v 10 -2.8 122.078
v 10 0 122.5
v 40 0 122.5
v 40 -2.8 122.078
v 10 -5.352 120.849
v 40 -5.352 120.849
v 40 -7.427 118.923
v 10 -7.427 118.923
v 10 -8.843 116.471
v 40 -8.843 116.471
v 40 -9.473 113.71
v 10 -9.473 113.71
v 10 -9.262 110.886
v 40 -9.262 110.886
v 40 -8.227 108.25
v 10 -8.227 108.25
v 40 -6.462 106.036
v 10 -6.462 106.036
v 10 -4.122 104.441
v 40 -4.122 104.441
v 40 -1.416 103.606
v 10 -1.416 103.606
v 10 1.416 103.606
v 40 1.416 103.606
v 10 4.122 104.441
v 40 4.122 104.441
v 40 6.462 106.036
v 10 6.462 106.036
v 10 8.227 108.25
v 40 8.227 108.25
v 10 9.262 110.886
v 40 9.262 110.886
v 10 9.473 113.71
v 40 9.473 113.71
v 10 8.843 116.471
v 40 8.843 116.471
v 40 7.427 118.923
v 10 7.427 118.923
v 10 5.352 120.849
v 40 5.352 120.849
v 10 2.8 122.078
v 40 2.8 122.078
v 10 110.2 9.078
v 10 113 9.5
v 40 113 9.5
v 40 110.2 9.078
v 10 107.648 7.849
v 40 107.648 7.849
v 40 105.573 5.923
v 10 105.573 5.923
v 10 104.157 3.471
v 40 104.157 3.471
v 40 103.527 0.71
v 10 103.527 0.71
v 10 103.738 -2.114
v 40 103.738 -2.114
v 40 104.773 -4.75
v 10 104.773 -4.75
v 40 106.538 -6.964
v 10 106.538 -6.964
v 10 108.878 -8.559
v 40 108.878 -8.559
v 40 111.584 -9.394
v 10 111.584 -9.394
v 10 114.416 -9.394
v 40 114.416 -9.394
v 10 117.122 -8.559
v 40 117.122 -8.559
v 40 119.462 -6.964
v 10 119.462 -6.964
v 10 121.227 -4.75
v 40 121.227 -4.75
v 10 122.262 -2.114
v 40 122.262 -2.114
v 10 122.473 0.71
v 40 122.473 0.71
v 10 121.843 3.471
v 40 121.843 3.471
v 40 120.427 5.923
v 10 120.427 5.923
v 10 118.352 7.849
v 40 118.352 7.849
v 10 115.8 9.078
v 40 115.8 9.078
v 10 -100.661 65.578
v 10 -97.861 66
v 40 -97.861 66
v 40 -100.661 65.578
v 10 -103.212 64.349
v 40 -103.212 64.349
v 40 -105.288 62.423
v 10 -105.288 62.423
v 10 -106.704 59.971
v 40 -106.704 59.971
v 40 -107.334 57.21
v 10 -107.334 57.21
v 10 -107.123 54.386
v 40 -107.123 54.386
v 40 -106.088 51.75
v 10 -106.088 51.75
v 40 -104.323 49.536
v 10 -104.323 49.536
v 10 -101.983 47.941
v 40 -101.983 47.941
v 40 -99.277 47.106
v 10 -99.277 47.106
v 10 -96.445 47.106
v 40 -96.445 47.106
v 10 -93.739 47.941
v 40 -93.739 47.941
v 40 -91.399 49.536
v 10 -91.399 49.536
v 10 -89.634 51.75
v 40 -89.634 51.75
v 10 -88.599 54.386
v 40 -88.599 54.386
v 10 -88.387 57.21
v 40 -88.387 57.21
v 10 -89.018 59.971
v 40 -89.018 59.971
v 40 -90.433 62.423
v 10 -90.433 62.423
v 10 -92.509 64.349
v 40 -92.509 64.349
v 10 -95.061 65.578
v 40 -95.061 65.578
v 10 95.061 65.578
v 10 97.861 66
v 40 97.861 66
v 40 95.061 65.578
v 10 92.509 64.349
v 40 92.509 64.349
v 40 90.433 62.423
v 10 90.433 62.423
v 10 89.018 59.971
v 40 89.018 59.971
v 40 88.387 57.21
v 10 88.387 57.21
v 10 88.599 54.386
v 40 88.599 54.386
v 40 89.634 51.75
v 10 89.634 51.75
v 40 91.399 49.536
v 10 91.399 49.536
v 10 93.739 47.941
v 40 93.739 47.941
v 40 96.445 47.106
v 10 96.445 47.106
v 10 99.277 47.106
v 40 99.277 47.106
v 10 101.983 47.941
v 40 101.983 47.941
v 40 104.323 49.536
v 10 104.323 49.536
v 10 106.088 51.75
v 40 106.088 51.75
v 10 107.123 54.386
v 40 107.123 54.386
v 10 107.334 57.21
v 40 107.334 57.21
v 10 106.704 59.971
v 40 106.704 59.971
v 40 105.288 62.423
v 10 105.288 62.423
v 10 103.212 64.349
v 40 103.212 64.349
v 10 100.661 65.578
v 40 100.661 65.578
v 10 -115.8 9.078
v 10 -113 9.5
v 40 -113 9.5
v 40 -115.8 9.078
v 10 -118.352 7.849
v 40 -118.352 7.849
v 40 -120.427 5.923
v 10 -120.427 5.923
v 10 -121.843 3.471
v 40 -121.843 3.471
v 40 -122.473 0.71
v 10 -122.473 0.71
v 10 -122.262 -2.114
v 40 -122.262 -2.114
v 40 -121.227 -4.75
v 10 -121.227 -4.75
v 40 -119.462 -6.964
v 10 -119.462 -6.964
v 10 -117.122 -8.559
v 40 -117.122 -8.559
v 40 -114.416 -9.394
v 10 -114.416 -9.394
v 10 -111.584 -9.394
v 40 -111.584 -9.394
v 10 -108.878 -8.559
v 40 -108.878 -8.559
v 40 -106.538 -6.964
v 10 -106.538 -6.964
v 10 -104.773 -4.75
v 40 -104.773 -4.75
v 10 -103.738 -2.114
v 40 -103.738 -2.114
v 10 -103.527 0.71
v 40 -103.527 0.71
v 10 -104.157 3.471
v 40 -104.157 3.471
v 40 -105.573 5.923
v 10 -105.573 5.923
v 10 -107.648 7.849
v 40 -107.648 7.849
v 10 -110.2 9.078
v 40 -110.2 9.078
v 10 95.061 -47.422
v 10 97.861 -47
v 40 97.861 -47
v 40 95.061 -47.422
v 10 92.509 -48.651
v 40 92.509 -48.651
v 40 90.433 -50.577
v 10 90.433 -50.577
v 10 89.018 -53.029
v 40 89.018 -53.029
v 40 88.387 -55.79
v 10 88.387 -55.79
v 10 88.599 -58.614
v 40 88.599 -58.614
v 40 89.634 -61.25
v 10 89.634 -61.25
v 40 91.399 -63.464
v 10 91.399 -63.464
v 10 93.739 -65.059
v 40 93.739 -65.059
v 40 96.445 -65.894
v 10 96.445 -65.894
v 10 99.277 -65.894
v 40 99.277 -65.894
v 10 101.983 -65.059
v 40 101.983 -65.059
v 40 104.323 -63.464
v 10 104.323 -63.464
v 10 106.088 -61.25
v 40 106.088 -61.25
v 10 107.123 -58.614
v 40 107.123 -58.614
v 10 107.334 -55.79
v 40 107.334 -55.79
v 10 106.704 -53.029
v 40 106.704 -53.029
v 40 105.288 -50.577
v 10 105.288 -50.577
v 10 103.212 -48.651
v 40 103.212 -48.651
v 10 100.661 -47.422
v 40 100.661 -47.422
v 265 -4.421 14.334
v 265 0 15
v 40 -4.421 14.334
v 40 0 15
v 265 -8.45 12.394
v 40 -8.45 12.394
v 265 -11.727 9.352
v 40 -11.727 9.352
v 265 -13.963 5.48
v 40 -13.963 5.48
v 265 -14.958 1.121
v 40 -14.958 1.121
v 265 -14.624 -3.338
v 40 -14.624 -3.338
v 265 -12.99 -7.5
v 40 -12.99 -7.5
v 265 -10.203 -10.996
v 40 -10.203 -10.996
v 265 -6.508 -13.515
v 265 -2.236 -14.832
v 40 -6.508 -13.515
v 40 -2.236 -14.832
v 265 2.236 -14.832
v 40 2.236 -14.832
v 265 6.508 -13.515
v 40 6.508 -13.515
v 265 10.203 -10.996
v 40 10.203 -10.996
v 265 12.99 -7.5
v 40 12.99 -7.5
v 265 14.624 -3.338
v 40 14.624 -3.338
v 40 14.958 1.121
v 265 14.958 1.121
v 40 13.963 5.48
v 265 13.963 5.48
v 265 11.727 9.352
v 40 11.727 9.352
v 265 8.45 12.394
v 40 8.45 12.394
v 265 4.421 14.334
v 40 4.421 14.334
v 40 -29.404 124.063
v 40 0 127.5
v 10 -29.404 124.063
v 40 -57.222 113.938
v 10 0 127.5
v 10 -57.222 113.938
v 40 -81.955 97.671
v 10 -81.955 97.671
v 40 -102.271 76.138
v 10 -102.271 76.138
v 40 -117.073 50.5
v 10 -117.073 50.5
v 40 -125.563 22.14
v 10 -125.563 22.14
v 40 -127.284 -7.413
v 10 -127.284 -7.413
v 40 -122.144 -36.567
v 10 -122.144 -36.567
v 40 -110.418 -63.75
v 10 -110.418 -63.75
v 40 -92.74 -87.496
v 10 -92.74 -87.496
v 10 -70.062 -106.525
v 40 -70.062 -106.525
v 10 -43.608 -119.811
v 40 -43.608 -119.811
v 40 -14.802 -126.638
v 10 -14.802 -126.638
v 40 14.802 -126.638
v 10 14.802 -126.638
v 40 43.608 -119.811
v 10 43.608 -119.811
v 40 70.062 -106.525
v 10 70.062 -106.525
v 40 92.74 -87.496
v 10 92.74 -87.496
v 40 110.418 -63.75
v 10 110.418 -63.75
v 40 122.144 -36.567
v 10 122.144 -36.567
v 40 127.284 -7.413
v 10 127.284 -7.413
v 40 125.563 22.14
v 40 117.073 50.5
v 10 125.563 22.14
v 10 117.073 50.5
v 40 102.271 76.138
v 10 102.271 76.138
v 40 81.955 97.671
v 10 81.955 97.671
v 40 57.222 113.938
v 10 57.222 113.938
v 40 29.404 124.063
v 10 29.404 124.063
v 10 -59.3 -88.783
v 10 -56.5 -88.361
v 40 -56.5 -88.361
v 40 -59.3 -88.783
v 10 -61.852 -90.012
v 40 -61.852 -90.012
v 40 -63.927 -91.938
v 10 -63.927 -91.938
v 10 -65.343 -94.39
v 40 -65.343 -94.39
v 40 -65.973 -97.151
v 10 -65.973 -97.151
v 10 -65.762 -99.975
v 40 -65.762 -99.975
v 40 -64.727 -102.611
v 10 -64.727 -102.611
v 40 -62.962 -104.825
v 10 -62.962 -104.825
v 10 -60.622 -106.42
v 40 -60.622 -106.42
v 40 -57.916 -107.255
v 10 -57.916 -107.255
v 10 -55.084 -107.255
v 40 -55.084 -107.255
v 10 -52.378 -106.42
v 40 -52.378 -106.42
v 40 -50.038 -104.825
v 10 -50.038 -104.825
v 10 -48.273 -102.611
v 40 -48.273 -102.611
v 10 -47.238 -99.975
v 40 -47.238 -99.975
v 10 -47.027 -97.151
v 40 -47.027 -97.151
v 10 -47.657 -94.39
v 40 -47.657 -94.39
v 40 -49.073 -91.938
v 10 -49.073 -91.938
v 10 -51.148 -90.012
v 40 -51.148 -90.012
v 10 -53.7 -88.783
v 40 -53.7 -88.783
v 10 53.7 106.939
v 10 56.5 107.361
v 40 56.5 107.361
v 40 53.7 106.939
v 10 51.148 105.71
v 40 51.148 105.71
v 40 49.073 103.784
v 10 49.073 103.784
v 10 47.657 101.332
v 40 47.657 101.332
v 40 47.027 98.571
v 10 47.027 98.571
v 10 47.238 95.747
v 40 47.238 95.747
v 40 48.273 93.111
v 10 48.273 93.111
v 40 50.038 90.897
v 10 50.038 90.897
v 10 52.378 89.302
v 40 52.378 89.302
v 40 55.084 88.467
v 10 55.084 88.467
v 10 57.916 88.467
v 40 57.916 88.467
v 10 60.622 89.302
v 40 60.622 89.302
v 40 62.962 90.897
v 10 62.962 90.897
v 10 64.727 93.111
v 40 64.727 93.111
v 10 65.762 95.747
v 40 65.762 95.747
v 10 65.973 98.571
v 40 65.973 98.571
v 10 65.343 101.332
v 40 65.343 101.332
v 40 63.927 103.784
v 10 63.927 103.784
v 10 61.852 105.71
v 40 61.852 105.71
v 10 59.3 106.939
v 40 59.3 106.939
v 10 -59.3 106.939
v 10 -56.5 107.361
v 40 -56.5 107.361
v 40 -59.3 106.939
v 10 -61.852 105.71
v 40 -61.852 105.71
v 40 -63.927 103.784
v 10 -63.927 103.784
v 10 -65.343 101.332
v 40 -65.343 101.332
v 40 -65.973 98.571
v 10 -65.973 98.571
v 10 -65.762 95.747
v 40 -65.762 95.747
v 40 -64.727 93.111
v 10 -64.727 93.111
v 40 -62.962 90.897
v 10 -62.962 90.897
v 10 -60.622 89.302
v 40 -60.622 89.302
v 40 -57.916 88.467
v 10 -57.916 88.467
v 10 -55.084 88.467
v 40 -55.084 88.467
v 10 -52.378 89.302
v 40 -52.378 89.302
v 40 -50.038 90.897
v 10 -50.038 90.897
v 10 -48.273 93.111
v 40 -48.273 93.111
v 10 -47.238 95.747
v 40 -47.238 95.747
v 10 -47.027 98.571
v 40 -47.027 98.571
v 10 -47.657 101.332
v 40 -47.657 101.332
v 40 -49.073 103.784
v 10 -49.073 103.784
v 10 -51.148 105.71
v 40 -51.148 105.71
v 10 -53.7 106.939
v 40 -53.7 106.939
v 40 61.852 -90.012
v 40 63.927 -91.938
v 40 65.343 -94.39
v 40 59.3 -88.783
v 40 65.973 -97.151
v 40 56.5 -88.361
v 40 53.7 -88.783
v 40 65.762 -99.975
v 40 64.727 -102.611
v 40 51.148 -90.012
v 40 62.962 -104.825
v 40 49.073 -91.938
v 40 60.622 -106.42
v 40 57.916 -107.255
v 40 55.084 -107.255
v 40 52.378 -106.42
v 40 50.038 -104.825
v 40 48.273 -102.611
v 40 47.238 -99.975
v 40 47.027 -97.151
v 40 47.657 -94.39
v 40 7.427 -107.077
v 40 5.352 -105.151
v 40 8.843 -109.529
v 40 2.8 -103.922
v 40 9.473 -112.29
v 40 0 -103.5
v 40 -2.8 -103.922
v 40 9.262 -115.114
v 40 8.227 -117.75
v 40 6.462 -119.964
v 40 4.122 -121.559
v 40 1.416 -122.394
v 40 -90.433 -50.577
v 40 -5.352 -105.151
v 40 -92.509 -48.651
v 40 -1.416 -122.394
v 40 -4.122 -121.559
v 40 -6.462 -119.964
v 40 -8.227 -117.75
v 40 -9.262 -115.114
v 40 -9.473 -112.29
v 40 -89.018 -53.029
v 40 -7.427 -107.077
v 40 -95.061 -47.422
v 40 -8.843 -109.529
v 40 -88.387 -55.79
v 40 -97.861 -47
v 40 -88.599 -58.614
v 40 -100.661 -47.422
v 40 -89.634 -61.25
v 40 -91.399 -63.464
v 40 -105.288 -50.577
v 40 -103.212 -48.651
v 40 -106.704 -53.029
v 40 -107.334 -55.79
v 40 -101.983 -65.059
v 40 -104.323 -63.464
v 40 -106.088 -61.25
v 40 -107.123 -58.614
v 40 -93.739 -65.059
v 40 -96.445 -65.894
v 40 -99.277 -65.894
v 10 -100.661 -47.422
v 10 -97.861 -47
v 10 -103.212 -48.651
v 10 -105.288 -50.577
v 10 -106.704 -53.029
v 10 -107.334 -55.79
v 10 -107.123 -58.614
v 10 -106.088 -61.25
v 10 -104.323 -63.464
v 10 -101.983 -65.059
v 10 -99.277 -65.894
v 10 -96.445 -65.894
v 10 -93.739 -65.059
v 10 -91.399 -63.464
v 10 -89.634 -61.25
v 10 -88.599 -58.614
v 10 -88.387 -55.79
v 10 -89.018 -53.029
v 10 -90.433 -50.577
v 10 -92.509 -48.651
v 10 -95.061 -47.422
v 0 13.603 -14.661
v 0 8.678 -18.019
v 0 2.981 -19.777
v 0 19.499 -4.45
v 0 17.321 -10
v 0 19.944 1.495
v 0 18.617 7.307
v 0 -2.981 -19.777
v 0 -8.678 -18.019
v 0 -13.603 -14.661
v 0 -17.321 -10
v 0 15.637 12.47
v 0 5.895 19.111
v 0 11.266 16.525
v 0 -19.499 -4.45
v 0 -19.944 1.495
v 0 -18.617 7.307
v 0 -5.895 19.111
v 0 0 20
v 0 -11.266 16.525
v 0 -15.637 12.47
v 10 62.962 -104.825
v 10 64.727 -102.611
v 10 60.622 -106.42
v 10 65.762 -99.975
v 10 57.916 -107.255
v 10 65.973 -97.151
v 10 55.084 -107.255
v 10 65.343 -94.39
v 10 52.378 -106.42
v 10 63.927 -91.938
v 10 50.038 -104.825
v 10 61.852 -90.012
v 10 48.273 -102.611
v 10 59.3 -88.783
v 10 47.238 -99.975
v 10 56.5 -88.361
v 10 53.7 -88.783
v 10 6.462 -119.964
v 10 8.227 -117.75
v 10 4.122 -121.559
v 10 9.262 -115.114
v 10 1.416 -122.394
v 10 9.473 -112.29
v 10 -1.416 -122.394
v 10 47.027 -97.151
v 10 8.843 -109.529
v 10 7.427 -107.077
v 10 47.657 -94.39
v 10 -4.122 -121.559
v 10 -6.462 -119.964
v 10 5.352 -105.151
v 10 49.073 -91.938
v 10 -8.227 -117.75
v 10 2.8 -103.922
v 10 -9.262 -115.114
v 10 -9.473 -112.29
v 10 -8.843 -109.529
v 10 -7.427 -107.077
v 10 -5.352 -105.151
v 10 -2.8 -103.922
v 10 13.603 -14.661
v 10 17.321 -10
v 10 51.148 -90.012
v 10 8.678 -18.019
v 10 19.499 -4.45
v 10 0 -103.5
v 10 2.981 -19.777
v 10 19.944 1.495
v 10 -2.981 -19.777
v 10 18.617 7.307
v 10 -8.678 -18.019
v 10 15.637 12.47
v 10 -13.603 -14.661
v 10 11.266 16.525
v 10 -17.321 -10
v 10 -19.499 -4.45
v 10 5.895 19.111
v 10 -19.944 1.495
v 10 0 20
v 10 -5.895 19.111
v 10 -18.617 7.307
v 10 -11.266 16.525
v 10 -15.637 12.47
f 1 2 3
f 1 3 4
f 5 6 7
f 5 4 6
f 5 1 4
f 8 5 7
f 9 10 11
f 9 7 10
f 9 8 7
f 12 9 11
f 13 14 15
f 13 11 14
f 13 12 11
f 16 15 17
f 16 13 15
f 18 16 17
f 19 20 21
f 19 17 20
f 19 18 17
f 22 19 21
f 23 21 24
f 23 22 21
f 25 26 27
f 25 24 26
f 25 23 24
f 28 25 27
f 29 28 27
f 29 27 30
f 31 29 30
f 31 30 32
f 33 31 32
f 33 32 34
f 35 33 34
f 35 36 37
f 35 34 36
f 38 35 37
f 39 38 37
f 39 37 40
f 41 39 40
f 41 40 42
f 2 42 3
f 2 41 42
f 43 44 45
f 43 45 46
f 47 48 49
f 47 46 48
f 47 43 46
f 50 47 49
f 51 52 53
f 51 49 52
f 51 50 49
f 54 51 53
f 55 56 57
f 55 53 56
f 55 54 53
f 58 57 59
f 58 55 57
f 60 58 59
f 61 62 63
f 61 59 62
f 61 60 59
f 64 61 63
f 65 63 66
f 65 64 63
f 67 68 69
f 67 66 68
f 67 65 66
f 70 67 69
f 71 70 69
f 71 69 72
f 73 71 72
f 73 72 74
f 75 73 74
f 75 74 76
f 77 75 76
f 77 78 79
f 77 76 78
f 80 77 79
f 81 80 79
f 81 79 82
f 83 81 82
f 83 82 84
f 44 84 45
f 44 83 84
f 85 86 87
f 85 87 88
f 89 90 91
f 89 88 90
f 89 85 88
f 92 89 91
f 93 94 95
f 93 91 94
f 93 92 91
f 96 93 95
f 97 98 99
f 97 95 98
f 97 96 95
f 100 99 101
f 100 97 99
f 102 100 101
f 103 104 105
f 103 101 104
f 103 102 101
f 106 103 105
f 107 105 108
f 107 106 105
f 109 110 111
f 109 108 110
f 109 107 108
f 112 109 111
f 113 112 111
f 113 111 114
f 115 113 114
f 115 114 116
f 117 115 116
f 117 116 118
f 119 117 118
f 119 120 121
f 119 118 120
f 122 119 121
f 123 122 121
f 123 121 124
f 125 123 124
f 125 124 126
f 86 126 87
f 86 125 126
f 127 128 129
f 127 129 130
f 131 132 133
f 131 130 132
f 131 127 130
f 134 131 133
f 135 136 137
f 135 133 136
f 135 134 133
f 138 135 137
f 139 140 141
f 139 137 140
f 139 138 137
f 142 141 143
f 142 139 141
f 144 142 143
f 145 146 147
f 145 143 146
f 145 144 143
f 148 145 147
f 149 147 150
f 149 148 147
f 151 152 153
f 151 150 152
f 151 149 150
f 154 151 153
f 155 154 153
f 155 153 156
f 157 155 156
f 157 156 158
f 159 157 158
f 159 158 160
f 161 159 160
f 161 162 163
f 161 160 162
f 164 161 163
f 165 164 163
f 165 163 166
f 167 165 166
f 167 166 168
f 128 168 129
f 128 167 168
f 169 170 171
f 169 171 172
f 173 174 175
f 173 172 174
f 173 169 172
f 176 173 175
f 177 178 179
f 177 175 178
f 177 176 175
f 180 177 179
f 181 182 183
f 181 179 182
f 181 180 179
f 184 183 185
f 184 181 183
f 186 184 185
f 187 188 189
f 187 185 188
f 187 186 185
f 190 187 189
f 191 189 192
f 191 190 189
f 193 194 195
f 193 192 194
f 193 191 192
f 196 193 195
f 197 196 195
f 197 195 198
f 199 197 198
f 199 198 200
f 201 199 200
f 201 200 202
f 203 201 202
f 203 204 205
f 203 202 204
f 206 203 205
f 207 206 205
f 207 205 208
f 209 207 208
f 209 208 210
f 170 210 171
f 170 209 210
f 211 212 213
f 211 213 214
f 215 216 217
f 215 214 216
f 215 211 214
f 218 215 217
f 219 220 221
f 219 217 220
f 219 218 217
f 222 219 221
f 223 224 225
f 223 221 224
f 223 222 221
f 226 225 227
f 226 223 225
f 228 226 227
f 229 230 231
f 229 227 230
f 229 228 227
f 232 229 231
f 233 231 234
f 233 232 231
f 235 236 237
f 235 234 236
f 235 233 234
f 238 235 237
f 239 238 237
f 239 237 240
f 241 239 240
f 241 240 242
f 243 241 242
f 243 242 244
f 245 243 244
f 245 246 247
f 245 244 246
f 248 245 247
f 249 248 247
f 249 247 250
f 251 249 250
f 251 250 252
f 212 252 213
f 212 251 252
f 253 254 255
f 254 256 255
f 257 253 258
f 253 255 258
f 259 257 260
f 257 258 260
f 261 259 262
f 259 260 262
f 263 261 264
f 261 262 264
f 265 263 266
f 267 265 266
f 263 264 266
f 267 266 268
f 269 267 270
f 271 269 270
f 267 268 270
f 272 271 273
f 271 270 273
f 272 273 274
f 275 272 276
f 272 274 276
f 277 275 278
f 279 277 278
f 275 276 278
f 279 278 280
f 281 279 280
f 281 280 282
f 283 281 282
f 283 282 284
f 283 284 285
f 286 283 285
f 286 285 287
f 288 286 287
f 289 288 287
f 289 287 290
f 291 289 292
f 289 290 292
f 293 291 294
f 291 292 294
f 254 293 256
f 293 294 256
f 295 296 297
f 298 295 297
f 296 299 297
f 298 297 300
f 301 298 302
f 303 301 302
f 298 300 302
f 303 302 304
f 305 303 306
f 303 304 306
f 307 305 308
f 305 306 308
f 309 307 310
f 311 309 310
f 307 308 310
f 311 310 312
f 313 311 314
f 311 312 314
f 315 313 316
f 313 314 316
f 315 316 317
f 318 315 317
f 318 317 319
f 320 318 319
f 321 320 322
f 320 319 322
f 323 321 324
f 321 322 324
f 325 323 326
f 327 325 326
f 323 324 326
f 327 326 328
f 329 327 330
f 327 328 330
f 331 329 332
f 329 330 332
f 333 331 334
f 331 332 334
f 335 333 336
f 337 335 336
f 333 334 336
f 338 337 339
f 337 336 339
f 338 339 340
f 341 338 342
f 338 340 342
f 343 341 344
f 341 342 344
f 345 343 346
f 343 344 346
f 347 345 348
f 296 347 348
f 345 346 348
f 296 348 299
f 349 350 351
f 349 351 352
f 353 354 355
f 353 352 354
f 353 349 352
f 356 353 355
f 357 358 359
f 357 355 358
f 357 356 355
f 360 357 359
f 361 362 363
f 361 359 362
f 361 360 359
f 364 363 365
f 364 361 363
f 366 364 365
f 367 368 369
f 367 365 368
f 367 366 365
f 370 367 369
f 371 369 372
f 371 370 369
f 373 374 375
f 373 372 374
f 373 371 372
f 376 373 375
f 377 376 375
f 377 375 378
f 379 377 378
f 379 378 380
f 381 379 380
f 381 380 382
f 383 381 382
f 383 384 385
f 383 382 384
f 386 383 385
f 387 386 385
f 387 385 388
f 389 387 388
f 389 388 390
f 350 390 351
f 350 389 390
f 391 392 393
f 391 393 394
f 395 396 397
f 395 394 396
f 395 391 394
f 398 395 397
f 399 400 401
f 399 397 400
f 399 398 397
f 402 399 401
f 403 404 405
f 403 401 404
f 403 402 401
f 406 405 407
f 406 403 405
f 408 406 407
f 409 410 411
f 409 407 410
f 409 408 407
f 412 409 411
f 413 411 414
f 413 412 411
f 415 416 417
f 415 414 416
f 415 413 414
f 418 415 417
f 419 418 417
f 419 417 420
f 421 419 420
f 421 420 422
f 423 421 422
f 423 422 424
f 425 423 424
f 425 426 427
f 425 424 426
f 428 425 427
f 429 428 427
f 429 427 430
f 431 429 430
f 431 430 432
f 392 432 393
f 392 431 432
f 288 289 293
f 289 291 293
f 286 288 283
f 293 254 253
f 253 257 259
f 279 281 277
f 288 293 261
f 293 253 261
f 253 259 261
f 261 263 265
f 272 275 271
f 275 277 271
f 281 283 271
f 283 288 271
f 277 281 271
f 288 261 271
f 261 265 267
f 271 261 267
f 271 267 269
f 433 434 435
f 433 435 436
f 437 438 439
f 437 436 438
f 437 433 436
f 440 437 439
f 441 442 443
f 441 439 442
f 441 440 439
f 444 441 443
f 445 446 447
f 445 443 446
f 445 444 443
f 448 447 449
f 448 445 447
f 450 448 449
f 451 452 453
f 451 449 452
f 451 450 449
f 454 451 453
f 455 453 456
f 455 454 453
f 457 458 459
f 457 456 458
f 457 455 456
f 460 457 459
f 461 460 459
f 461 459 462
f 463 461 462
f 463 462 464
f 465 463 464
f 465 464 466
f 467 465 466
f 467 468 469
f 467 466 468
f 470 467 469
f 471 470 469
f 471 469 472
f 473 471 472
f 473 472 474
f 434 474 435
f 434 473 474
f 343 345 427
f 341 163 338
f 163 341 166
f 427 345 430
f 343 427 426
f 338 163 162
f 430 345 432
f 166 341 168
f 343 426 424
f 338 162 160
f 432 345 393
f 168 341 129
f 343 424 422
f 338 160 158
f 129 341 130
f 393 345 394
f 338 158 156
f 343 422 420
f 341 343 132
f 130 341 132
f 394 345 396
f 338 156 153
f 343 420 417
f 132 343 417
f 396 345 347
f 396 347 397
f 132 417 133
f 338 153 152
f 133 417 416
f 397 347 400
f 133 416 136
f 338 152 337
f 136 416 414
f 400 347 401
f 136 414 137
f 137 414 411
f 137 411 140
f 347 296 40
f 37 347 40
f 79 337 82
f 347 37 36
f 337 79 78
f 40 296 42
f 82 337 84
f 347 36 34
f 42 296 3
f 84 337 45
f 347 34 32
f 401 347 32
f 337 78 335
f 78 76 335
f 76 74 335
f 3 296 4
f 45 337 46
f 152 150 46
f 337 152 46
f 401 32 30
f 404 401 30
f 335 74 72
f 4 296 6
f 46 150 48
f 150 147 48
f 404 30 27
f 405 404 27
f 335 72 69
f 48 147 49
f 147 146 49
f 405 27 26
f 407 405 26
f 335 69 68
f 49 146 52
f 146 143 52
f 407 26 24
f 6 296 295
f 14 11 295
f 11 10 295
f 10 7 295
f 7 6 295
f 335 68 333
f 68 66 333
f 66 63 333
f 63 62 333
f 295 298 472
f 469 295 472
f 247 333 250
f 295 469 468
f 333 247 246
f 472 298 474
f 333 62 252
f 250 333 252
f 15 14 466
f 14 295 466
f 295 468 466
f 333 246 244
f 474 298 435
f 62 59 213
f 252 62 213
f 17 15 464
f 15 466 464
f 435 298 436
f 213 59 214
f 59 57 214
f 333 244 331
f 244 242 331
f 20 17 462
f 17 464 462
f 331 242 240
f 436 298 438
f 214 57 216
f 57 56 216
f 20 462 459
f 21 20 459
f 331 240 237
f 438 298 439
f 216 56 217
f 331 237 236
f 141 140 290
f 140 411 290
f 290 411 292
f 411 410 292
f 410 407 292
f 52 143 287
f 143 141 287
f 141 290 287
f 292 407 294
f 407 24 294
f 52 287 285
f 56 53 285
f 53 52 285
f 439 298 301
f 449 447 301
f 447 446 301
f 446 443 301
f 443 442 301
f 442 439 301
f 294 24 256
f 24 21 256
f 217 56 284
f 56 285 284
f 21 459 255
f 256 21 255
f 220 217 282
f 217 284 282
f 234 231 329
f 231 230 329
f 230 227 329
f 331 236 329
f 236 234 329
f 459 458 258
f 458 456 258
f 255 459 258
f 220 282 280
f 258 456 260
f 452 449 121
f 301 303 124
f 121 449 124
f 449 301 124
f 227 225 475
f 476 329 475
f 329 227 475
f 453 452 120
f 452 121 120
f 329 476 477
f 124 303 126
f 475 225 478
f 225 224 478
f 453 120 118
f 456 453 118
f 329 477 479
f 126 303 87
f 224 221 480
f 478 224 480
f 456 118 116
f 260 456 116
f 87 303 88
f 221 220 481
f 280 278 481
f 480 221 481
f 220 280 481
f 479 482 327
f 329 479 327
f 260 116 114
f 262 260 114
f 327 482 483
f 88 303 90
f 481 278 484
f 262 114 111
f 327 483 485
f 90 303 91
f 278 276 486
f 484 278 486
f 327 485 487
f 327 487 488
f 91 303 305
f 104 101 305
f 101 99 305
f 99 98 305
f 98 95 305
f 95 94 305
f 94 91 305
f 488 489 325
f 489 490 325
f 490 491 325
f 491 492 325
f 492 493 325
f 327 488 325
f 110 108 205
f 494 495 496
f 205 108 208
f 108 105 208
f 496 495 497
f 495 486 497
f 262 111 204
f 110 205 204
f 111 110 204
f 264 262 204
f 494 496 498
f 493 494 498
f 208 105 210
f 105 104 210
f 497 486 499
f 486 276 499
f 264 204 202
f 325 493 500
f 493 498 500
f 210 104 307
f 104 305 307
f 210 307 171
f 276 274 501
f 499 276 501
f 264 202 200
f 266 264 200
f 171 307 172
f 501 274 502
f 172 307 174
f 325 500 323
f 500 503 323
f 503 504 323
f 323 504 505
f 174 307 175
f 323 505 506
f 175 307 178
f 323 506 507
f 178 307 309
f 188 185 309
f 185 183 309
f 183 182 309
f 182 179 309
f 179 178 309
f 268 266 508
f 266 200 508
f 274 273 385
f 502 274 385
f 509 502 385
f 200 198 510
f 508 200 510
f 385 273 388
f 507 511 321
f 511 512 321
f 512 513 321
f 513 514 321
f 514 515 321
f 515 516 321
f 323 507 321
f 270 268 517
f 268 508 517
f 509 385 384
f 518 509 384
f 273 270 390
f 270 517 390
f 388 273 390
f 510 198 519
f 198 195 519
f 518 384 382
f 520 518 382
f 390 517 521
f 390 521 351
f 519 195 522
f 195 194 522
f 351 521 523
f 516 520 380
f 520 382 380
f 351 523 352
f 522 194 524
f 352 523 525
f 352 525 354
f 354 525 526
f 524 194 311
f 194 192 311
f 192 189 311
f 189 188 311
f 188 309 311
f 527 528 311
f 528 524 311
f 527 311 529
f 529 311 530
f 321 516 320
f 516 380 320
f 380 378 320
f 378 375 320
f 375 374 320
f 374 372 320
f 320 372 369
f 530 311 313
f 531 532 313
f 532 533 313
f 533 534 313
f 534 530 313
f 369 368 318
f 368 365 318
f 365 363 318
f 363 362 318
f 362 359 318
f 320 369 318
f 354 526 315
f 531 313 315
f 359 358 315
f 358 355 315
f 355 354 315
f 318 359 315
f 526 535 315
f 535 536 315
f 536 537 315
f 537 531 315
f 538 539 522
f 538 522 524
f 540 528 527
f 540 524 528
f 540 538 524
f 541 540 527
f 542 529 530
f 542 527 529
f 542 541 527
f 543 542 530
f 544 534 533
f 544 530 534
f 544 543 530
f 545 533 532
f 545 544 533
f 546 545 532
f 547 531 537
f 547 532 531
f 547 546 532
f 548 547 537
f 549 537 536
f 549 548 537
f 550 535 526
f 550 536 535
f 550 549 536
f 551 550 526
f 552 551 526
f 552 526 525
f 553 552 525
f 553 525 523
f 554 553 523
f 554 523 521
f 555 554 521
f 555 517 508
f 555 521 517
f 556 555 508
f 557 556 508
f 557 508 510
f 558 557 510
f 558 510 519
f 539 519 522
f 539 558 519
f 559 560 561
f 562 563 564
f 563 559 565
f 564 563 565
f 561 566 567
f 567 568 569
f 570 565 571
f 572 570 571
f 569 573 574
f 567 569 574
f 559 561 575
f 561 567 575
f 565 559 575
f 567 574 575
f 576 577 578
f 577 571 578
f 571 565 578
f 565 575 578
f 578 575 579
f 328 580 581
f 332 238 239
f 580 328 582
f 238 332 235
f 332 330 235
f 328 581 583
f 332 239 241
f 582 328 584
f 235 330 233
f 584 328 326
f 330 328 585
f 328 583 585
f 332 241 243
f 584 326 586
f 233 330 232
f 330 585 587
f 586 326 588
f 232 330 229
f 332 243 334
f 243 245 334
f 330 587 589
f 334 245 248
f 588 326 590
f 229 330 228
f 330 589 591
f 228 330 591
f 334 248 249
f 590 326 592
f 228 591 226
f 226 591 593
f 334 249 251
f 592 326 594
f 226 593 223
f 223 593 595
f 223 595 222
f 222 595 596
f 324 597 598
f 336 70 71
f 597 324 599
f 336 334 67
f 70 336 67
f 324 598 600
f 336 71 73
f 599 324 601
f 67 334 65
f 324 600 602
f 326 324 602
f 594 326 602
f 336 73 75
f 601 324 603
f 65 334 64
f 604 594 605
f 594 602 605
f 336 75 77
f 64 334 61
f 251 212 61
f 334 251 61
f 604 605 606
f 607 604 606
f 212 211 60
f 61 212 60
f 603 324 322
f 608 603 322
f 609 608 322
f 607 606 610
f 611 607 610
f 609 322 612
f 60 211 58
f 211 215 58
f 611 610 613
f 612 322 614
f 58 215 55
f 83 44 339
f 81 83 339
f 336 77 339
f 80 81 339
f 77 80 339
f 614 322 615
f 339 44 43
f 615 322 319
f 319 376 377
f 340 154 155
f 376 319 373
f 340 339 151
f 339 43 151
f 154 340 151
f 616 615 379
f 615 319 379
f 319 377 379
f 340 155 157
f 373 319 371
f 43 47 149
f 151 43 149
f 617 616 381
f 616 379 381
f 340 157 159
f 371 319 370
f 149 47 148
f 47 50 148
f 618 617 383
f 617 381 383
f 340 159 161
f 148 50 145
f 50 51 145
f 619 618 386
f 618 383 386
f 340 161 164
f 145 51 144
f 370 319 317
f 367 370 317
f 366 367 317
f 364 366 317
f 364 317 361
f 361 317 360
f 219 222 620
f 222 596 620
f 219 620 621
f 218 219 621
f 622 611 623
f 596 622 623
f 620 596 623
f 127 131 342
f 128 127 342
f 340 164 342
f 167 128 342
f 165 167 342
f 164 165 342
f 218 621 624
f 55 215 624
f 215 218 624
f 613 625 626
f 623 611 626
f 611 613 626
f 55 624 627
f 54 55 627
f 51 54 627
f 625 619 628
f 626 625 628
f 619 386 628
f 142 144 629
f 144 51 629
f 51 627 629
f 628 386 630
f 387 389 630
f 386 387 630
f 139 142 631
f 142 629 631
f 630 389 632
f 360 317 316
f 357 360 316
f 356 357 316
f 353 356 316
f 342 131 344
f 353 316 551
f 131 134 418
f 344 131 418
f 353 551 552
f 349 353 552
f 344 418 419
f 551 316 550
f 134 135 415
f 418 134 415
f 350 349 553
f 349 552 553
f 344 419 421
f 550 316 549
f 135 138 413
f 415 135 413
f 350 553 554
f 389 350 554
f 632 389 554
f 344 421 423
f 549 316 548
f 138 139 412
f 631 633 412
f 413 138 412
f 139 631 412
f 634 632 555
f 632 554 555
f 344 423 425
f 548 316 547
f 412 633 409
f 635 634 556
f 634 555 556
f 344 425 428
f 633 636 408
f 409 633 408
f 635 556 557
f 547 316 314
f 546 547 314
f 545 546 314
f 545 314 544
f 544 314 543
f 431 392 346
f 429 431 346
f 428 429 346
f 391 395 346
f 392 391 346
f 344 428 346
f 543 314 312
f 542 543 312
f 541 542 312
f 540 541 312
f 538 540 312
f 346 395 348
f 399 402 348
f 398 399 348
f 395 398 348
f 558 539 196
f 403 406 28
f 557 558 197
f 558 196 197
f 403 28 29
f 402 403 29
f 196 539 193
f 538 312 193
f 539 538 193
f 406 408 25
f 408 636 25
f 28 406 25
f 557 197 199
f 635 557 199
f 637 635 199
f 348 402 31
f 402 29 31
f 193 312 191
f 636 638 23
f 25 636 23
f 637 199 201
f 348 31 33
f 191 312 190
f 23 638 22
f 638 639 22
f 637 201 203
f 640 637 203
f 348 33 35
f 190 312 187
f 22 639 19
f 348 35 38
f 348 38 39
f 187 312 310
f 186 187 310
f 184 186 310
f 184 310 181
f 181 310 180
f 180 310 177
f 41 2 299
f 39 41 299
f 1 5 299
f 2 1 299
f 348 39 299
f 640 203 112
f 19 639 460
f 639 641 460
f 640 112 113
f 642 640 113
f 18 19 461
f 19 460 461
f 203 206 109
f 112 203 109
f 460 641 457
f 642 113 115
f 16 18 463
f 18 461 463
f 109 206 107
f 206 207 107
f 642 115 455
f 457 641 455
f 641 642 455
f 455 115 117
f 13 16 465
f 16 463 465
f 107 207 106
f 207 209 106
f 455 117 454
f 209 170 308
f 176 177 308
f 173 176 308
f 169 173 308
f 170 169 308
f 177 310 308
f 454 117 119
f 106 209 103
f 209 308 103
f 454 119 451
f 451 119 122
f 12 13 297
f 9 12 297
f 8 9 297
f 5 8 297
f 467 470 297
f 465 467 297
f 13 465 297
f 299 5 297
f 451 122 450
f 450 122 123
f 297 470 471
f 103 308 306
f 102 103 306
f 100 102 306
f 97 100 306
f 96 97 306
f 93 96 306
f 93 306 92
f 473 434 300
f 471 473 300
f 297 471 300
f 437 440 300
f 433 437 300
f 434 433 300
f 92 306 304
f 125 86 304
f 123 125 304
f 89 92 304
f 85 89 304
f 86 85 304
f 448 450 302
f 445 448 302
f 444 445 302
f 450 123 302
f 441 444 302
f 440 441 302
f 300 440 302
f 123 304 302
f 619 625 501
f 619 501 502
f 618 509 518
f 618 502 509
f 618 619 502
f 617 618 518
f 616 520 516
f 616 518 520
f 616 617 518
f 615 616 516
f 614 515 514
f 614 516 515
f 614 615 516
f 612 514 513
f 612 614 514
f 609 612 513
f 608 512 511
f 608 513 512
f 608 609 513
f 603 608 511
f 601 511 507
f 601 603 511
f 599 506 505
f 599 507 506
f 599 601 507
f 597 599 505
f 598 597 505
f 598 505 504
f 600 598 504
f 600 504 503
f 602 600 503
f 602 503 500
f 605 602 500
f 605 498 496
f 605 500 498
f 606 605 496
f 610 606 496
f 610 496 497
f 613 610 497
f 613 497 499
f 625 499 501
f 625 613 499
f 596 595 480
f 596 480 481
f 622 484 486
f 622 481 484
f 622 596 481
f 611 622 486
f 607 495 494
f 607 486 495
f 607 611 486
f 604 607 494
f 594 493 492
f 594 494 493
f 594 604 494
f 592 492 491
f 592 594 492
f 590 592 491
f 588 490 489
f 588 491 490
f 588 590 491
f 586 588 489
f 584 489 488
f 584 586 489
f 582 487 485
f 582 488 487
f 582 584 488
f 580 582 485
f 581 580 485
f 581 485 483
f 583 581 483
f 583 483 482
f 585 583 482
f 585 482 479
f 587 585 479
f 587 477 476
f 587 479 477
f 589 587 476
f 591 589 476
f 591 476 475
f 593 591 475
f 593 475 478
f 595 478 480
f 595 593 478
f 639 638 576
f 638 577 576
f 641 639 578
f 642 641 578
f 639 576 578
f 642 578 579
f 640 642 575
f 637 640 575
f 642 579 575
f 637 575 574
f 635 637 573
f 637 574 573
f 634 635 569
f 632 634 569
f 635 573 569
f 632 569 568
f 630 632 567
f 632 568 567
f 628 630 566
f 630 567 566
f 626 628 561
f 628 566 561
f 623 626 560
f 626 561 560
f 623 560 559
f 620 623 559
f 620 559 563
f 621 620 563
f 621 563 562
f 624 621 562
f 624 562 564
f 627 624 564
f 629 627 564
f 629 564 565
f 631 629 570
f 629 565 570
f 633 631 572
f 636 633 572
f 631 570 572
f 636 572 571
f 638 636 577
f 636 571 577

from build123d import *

# Parameters (mm, degrees)
SKETCH_2_R           = 9.5
CUT_EXTRUDE_1_DEPTH  = 321.526909947
SKETCH_3_R           = 9.5
CUT_EXTRUDE_2_DEPTH  = 321.526909947
SKETCH_4_R           = 9.5
CUT_EXTRUDE_3_DEPTH  = 321.526909947
SKETCH_5_R           = 9.5
CUT_EXTRUDE_4_DEPTH  = 321.526909947
SKETCH_6_R           = 9.5
CUT_EXTRUDE_5_DEPTH  = 321.526909947
SKETCH_7_R           = 9.5
CUT_EXTRUDE_6_DEPTH  = 321.526909947
SKETCH_8_R           = 9.5
CUT_EXTRUDE_7_DEPTH  = 321.526909947
SKETCH_9_R           = 9.5
CUT_EXTRUDE_8_DEPTH  = 321.526909947
SKETCH_10_R          = 9.5
CUT_EXTRUDE_9_DEPTH  = 321.526909947
SKETCH_11_R          = 9.5
CUT_EXTRUDE_10_DEPTH = 321.526909947
SKETCH_12_R          = 9.5
CUT_EXTRUDE_11_DEPTH = 321.526909947
SKETCH_13_R          = 9.5
CUT_EXTRUDE_12_DEPTH = 321.526909947


with BuildPart() as part:
    # Эскиз1 → Повернуть1 (revolve)
    with BuildSketch(Plane.XY, mode=Mode.PRIVATE) as revolve_1_sk:
        Polygon((0, 0), (265, 0), (265, 15), (40, 15), (40, 127.5), (10, 127.5), (10, 20), (0, 20), align=None)
    revolve(revolve_1_sk.sketch.rotate(Axis((0, 0, 0), (1, 0, 0)), 90), axis=Axis((0, 0, 0), (1, 0, 0)))

    # Эскиз2 → Вырез-Вытянуть1 (cut, through all)
    with BuildSketch(Plane(origin=(0, 0, 0), x_dir=(0, 0, -1), z_dir=(1, 0, 0))):
        with Locations(Location((0, 113, 0), (0, 0, 180))):
            Circle(SKETCH_2_R)
    extrude(amount=CUT_EXTRUDE_1_DEPTH, mode=Mode.SUBTRACT)

    # Эскиз3 → Вырез-Вытянуть2 (cut, through all)
    with BuildSketch(Plane(origin=(0, 0, 0), x_dir=(0, 0, -1), z_dir=(1, 0, 0))):
        with Locations(Location((-56.5, 97.860870628, 0), (0, 0, 180))):
            Circle(SKETCH_3_R)
    extrude(amount=CUT_EXTRUDE_2_DEPTH, mode=Mode.SUBTRACT)

    # Эскиз4 → Вырез-Вытянуть3 (cut, through all)
    with BuildSketch(Plane(origin=(0, 0, 0), x_dir=(0, 0, -1), z_dir=(1, 0, 0))):
        with Locations(Location((-97.860870628, 56.5, 0), (0, 0, 180))):
            Circle(SKETCH_4_R)
    extrude(amount=CUT_EXTRUDE_3_DEPTH, mode=Mode.SUBTRACT)

    # Эскиз5 → Вырез-Вытянуть4 (cut, through all)
    with BuildSketch(Plane(origin=(0, 0, 0), x_dir=(0, 0, -1), z_dir=(1, 0, 0))):
        with Locations(Location((-113, 0, 0), (0, 0, 180))):
            Circle(SKETCH_5_R)
    extrude(amount=CUT_EXTRUDE_4_DEPTH, mode=Mode.SUBTRACT)

    # Эскиз6 → Вырез-Вытянуть5 (cut, through all)
    with BuildSketch(Plane(origin=(0, 0, 0), x_dir=(0, 0, -1), z_dir=(1, 0, 0))):
        with Locations(Location((-97.860870628, -56.5, 0), (0, 0, 180))):
            Circle(SKETCH_6_R)
    extrude(amount=CUT_EXTRUDE_5_DEPTH, mode=Mode.SUBTRACT)

    # Эскиз7 → Вырез-Вытянуть6 (cut, through all)
    with BuildSketch(Plane(origin=(0, 0, 0), x_dir=(0, 0, -1), z_dir=(1, 0, 0))):
        with Locations(Location((-56.5, -97.860870628, 0), (0, 0, 180))):
            Circle(SKETCH_7_R)
    extrude(amount=CUT_EXTRUDE_6_DEPTH, mode=Mode.SUBTRACT)

    # Эскиз8 → Вырез-Вытянуть7 (cut, through all)
    with BuildSketch(Plane(origin=(0, 0, 0), x_dir=(0, 0, -1), z_dir=(1, 0, 0))):
        with Locations(Location((0, -113, 0), (0, 0, 180))):
            Circle(SKETCH_8_R)
    extrude(amount=CUT_EXTRUDE_7_DEPTH, mode=Mode.SUBTRACT)

    # Эскиз9 → Вырез-Вытянуть8 (cut, through all)
    with BuildSketch(Plane(origin=(0, 0, 0), x_dir=(0, 0, -1), z_dir=(1, 0, 0))):
        with Locations(Location((56.5, -97.860870628, 0), (0, 0, 180))):
            Circle(SKETCH_9_R)
    extrude(amount=CUT_EXTRUDE_8_DEPTH, mode=Mode.SUBTRACT)

    # Эскиз10 → Вырез-Вытянуть9 (cut, through all)
    with BuildSketch(Plane(origin=(0, 0, 0), x_dir=(0, 0, -1), z_dir=(1, 0, 0))):
        with Locations(Location((97.860870628, -56.5, 0), (0, 0, 180))):
            Circle(SKETCH_10_R)
    extrude(amount=CUT_EXTRUDE_9_DEPTH, mode=Mode.SUBTRACT)

    # Эскиз11 → Вырез-Вытянуть10 (cut, through all)
    with BuildSketch(Plane(origin=(0, 0, 0), x_dir=(0, 0, -1), z_dir=(1, 0, 0))):
        with Locations(Location((113, 0, 0), (0, 0, 180))):
            Circle(SKETCH_11_R)
    extrude(amount=CUT_EXTRUDE_10_DEPTH, mode=Mode.SUBTRACT)

    # Эскиз12 → Вырез-Вытянуть11 (cut, through all)
    with BuildSketch(Plane(origin=(0, 0, 0), x_dir=(0, 0, -1), z_dir=(1, 0, 0))):
        with Locations(Location((97.860870628, 56.5, 0), (0, 0, 180))):
            Circle(SKETCH_12_R)
    extrude(amount=CUT_EXTRUDE_11_DEPTH, mode=Mode.SUBTRACT)

    # Эскиз13 → Вырез-Вытянуть12 (cut, through all)
    with BuildSketch(Plane(origin=(0, 0, 0), x_dir=(0, 0, -1), z_dir=(1, 0, 0))):
        with Locations(Location((56.5, 97.860870628, 0), (0, 0, 180))):
            Circle(SKETCH_13_R)
    extrude(amount=CUT_EXTRUDE_12_DEPTH, mode=Mode.SUBTRACT)


solid = part.part
